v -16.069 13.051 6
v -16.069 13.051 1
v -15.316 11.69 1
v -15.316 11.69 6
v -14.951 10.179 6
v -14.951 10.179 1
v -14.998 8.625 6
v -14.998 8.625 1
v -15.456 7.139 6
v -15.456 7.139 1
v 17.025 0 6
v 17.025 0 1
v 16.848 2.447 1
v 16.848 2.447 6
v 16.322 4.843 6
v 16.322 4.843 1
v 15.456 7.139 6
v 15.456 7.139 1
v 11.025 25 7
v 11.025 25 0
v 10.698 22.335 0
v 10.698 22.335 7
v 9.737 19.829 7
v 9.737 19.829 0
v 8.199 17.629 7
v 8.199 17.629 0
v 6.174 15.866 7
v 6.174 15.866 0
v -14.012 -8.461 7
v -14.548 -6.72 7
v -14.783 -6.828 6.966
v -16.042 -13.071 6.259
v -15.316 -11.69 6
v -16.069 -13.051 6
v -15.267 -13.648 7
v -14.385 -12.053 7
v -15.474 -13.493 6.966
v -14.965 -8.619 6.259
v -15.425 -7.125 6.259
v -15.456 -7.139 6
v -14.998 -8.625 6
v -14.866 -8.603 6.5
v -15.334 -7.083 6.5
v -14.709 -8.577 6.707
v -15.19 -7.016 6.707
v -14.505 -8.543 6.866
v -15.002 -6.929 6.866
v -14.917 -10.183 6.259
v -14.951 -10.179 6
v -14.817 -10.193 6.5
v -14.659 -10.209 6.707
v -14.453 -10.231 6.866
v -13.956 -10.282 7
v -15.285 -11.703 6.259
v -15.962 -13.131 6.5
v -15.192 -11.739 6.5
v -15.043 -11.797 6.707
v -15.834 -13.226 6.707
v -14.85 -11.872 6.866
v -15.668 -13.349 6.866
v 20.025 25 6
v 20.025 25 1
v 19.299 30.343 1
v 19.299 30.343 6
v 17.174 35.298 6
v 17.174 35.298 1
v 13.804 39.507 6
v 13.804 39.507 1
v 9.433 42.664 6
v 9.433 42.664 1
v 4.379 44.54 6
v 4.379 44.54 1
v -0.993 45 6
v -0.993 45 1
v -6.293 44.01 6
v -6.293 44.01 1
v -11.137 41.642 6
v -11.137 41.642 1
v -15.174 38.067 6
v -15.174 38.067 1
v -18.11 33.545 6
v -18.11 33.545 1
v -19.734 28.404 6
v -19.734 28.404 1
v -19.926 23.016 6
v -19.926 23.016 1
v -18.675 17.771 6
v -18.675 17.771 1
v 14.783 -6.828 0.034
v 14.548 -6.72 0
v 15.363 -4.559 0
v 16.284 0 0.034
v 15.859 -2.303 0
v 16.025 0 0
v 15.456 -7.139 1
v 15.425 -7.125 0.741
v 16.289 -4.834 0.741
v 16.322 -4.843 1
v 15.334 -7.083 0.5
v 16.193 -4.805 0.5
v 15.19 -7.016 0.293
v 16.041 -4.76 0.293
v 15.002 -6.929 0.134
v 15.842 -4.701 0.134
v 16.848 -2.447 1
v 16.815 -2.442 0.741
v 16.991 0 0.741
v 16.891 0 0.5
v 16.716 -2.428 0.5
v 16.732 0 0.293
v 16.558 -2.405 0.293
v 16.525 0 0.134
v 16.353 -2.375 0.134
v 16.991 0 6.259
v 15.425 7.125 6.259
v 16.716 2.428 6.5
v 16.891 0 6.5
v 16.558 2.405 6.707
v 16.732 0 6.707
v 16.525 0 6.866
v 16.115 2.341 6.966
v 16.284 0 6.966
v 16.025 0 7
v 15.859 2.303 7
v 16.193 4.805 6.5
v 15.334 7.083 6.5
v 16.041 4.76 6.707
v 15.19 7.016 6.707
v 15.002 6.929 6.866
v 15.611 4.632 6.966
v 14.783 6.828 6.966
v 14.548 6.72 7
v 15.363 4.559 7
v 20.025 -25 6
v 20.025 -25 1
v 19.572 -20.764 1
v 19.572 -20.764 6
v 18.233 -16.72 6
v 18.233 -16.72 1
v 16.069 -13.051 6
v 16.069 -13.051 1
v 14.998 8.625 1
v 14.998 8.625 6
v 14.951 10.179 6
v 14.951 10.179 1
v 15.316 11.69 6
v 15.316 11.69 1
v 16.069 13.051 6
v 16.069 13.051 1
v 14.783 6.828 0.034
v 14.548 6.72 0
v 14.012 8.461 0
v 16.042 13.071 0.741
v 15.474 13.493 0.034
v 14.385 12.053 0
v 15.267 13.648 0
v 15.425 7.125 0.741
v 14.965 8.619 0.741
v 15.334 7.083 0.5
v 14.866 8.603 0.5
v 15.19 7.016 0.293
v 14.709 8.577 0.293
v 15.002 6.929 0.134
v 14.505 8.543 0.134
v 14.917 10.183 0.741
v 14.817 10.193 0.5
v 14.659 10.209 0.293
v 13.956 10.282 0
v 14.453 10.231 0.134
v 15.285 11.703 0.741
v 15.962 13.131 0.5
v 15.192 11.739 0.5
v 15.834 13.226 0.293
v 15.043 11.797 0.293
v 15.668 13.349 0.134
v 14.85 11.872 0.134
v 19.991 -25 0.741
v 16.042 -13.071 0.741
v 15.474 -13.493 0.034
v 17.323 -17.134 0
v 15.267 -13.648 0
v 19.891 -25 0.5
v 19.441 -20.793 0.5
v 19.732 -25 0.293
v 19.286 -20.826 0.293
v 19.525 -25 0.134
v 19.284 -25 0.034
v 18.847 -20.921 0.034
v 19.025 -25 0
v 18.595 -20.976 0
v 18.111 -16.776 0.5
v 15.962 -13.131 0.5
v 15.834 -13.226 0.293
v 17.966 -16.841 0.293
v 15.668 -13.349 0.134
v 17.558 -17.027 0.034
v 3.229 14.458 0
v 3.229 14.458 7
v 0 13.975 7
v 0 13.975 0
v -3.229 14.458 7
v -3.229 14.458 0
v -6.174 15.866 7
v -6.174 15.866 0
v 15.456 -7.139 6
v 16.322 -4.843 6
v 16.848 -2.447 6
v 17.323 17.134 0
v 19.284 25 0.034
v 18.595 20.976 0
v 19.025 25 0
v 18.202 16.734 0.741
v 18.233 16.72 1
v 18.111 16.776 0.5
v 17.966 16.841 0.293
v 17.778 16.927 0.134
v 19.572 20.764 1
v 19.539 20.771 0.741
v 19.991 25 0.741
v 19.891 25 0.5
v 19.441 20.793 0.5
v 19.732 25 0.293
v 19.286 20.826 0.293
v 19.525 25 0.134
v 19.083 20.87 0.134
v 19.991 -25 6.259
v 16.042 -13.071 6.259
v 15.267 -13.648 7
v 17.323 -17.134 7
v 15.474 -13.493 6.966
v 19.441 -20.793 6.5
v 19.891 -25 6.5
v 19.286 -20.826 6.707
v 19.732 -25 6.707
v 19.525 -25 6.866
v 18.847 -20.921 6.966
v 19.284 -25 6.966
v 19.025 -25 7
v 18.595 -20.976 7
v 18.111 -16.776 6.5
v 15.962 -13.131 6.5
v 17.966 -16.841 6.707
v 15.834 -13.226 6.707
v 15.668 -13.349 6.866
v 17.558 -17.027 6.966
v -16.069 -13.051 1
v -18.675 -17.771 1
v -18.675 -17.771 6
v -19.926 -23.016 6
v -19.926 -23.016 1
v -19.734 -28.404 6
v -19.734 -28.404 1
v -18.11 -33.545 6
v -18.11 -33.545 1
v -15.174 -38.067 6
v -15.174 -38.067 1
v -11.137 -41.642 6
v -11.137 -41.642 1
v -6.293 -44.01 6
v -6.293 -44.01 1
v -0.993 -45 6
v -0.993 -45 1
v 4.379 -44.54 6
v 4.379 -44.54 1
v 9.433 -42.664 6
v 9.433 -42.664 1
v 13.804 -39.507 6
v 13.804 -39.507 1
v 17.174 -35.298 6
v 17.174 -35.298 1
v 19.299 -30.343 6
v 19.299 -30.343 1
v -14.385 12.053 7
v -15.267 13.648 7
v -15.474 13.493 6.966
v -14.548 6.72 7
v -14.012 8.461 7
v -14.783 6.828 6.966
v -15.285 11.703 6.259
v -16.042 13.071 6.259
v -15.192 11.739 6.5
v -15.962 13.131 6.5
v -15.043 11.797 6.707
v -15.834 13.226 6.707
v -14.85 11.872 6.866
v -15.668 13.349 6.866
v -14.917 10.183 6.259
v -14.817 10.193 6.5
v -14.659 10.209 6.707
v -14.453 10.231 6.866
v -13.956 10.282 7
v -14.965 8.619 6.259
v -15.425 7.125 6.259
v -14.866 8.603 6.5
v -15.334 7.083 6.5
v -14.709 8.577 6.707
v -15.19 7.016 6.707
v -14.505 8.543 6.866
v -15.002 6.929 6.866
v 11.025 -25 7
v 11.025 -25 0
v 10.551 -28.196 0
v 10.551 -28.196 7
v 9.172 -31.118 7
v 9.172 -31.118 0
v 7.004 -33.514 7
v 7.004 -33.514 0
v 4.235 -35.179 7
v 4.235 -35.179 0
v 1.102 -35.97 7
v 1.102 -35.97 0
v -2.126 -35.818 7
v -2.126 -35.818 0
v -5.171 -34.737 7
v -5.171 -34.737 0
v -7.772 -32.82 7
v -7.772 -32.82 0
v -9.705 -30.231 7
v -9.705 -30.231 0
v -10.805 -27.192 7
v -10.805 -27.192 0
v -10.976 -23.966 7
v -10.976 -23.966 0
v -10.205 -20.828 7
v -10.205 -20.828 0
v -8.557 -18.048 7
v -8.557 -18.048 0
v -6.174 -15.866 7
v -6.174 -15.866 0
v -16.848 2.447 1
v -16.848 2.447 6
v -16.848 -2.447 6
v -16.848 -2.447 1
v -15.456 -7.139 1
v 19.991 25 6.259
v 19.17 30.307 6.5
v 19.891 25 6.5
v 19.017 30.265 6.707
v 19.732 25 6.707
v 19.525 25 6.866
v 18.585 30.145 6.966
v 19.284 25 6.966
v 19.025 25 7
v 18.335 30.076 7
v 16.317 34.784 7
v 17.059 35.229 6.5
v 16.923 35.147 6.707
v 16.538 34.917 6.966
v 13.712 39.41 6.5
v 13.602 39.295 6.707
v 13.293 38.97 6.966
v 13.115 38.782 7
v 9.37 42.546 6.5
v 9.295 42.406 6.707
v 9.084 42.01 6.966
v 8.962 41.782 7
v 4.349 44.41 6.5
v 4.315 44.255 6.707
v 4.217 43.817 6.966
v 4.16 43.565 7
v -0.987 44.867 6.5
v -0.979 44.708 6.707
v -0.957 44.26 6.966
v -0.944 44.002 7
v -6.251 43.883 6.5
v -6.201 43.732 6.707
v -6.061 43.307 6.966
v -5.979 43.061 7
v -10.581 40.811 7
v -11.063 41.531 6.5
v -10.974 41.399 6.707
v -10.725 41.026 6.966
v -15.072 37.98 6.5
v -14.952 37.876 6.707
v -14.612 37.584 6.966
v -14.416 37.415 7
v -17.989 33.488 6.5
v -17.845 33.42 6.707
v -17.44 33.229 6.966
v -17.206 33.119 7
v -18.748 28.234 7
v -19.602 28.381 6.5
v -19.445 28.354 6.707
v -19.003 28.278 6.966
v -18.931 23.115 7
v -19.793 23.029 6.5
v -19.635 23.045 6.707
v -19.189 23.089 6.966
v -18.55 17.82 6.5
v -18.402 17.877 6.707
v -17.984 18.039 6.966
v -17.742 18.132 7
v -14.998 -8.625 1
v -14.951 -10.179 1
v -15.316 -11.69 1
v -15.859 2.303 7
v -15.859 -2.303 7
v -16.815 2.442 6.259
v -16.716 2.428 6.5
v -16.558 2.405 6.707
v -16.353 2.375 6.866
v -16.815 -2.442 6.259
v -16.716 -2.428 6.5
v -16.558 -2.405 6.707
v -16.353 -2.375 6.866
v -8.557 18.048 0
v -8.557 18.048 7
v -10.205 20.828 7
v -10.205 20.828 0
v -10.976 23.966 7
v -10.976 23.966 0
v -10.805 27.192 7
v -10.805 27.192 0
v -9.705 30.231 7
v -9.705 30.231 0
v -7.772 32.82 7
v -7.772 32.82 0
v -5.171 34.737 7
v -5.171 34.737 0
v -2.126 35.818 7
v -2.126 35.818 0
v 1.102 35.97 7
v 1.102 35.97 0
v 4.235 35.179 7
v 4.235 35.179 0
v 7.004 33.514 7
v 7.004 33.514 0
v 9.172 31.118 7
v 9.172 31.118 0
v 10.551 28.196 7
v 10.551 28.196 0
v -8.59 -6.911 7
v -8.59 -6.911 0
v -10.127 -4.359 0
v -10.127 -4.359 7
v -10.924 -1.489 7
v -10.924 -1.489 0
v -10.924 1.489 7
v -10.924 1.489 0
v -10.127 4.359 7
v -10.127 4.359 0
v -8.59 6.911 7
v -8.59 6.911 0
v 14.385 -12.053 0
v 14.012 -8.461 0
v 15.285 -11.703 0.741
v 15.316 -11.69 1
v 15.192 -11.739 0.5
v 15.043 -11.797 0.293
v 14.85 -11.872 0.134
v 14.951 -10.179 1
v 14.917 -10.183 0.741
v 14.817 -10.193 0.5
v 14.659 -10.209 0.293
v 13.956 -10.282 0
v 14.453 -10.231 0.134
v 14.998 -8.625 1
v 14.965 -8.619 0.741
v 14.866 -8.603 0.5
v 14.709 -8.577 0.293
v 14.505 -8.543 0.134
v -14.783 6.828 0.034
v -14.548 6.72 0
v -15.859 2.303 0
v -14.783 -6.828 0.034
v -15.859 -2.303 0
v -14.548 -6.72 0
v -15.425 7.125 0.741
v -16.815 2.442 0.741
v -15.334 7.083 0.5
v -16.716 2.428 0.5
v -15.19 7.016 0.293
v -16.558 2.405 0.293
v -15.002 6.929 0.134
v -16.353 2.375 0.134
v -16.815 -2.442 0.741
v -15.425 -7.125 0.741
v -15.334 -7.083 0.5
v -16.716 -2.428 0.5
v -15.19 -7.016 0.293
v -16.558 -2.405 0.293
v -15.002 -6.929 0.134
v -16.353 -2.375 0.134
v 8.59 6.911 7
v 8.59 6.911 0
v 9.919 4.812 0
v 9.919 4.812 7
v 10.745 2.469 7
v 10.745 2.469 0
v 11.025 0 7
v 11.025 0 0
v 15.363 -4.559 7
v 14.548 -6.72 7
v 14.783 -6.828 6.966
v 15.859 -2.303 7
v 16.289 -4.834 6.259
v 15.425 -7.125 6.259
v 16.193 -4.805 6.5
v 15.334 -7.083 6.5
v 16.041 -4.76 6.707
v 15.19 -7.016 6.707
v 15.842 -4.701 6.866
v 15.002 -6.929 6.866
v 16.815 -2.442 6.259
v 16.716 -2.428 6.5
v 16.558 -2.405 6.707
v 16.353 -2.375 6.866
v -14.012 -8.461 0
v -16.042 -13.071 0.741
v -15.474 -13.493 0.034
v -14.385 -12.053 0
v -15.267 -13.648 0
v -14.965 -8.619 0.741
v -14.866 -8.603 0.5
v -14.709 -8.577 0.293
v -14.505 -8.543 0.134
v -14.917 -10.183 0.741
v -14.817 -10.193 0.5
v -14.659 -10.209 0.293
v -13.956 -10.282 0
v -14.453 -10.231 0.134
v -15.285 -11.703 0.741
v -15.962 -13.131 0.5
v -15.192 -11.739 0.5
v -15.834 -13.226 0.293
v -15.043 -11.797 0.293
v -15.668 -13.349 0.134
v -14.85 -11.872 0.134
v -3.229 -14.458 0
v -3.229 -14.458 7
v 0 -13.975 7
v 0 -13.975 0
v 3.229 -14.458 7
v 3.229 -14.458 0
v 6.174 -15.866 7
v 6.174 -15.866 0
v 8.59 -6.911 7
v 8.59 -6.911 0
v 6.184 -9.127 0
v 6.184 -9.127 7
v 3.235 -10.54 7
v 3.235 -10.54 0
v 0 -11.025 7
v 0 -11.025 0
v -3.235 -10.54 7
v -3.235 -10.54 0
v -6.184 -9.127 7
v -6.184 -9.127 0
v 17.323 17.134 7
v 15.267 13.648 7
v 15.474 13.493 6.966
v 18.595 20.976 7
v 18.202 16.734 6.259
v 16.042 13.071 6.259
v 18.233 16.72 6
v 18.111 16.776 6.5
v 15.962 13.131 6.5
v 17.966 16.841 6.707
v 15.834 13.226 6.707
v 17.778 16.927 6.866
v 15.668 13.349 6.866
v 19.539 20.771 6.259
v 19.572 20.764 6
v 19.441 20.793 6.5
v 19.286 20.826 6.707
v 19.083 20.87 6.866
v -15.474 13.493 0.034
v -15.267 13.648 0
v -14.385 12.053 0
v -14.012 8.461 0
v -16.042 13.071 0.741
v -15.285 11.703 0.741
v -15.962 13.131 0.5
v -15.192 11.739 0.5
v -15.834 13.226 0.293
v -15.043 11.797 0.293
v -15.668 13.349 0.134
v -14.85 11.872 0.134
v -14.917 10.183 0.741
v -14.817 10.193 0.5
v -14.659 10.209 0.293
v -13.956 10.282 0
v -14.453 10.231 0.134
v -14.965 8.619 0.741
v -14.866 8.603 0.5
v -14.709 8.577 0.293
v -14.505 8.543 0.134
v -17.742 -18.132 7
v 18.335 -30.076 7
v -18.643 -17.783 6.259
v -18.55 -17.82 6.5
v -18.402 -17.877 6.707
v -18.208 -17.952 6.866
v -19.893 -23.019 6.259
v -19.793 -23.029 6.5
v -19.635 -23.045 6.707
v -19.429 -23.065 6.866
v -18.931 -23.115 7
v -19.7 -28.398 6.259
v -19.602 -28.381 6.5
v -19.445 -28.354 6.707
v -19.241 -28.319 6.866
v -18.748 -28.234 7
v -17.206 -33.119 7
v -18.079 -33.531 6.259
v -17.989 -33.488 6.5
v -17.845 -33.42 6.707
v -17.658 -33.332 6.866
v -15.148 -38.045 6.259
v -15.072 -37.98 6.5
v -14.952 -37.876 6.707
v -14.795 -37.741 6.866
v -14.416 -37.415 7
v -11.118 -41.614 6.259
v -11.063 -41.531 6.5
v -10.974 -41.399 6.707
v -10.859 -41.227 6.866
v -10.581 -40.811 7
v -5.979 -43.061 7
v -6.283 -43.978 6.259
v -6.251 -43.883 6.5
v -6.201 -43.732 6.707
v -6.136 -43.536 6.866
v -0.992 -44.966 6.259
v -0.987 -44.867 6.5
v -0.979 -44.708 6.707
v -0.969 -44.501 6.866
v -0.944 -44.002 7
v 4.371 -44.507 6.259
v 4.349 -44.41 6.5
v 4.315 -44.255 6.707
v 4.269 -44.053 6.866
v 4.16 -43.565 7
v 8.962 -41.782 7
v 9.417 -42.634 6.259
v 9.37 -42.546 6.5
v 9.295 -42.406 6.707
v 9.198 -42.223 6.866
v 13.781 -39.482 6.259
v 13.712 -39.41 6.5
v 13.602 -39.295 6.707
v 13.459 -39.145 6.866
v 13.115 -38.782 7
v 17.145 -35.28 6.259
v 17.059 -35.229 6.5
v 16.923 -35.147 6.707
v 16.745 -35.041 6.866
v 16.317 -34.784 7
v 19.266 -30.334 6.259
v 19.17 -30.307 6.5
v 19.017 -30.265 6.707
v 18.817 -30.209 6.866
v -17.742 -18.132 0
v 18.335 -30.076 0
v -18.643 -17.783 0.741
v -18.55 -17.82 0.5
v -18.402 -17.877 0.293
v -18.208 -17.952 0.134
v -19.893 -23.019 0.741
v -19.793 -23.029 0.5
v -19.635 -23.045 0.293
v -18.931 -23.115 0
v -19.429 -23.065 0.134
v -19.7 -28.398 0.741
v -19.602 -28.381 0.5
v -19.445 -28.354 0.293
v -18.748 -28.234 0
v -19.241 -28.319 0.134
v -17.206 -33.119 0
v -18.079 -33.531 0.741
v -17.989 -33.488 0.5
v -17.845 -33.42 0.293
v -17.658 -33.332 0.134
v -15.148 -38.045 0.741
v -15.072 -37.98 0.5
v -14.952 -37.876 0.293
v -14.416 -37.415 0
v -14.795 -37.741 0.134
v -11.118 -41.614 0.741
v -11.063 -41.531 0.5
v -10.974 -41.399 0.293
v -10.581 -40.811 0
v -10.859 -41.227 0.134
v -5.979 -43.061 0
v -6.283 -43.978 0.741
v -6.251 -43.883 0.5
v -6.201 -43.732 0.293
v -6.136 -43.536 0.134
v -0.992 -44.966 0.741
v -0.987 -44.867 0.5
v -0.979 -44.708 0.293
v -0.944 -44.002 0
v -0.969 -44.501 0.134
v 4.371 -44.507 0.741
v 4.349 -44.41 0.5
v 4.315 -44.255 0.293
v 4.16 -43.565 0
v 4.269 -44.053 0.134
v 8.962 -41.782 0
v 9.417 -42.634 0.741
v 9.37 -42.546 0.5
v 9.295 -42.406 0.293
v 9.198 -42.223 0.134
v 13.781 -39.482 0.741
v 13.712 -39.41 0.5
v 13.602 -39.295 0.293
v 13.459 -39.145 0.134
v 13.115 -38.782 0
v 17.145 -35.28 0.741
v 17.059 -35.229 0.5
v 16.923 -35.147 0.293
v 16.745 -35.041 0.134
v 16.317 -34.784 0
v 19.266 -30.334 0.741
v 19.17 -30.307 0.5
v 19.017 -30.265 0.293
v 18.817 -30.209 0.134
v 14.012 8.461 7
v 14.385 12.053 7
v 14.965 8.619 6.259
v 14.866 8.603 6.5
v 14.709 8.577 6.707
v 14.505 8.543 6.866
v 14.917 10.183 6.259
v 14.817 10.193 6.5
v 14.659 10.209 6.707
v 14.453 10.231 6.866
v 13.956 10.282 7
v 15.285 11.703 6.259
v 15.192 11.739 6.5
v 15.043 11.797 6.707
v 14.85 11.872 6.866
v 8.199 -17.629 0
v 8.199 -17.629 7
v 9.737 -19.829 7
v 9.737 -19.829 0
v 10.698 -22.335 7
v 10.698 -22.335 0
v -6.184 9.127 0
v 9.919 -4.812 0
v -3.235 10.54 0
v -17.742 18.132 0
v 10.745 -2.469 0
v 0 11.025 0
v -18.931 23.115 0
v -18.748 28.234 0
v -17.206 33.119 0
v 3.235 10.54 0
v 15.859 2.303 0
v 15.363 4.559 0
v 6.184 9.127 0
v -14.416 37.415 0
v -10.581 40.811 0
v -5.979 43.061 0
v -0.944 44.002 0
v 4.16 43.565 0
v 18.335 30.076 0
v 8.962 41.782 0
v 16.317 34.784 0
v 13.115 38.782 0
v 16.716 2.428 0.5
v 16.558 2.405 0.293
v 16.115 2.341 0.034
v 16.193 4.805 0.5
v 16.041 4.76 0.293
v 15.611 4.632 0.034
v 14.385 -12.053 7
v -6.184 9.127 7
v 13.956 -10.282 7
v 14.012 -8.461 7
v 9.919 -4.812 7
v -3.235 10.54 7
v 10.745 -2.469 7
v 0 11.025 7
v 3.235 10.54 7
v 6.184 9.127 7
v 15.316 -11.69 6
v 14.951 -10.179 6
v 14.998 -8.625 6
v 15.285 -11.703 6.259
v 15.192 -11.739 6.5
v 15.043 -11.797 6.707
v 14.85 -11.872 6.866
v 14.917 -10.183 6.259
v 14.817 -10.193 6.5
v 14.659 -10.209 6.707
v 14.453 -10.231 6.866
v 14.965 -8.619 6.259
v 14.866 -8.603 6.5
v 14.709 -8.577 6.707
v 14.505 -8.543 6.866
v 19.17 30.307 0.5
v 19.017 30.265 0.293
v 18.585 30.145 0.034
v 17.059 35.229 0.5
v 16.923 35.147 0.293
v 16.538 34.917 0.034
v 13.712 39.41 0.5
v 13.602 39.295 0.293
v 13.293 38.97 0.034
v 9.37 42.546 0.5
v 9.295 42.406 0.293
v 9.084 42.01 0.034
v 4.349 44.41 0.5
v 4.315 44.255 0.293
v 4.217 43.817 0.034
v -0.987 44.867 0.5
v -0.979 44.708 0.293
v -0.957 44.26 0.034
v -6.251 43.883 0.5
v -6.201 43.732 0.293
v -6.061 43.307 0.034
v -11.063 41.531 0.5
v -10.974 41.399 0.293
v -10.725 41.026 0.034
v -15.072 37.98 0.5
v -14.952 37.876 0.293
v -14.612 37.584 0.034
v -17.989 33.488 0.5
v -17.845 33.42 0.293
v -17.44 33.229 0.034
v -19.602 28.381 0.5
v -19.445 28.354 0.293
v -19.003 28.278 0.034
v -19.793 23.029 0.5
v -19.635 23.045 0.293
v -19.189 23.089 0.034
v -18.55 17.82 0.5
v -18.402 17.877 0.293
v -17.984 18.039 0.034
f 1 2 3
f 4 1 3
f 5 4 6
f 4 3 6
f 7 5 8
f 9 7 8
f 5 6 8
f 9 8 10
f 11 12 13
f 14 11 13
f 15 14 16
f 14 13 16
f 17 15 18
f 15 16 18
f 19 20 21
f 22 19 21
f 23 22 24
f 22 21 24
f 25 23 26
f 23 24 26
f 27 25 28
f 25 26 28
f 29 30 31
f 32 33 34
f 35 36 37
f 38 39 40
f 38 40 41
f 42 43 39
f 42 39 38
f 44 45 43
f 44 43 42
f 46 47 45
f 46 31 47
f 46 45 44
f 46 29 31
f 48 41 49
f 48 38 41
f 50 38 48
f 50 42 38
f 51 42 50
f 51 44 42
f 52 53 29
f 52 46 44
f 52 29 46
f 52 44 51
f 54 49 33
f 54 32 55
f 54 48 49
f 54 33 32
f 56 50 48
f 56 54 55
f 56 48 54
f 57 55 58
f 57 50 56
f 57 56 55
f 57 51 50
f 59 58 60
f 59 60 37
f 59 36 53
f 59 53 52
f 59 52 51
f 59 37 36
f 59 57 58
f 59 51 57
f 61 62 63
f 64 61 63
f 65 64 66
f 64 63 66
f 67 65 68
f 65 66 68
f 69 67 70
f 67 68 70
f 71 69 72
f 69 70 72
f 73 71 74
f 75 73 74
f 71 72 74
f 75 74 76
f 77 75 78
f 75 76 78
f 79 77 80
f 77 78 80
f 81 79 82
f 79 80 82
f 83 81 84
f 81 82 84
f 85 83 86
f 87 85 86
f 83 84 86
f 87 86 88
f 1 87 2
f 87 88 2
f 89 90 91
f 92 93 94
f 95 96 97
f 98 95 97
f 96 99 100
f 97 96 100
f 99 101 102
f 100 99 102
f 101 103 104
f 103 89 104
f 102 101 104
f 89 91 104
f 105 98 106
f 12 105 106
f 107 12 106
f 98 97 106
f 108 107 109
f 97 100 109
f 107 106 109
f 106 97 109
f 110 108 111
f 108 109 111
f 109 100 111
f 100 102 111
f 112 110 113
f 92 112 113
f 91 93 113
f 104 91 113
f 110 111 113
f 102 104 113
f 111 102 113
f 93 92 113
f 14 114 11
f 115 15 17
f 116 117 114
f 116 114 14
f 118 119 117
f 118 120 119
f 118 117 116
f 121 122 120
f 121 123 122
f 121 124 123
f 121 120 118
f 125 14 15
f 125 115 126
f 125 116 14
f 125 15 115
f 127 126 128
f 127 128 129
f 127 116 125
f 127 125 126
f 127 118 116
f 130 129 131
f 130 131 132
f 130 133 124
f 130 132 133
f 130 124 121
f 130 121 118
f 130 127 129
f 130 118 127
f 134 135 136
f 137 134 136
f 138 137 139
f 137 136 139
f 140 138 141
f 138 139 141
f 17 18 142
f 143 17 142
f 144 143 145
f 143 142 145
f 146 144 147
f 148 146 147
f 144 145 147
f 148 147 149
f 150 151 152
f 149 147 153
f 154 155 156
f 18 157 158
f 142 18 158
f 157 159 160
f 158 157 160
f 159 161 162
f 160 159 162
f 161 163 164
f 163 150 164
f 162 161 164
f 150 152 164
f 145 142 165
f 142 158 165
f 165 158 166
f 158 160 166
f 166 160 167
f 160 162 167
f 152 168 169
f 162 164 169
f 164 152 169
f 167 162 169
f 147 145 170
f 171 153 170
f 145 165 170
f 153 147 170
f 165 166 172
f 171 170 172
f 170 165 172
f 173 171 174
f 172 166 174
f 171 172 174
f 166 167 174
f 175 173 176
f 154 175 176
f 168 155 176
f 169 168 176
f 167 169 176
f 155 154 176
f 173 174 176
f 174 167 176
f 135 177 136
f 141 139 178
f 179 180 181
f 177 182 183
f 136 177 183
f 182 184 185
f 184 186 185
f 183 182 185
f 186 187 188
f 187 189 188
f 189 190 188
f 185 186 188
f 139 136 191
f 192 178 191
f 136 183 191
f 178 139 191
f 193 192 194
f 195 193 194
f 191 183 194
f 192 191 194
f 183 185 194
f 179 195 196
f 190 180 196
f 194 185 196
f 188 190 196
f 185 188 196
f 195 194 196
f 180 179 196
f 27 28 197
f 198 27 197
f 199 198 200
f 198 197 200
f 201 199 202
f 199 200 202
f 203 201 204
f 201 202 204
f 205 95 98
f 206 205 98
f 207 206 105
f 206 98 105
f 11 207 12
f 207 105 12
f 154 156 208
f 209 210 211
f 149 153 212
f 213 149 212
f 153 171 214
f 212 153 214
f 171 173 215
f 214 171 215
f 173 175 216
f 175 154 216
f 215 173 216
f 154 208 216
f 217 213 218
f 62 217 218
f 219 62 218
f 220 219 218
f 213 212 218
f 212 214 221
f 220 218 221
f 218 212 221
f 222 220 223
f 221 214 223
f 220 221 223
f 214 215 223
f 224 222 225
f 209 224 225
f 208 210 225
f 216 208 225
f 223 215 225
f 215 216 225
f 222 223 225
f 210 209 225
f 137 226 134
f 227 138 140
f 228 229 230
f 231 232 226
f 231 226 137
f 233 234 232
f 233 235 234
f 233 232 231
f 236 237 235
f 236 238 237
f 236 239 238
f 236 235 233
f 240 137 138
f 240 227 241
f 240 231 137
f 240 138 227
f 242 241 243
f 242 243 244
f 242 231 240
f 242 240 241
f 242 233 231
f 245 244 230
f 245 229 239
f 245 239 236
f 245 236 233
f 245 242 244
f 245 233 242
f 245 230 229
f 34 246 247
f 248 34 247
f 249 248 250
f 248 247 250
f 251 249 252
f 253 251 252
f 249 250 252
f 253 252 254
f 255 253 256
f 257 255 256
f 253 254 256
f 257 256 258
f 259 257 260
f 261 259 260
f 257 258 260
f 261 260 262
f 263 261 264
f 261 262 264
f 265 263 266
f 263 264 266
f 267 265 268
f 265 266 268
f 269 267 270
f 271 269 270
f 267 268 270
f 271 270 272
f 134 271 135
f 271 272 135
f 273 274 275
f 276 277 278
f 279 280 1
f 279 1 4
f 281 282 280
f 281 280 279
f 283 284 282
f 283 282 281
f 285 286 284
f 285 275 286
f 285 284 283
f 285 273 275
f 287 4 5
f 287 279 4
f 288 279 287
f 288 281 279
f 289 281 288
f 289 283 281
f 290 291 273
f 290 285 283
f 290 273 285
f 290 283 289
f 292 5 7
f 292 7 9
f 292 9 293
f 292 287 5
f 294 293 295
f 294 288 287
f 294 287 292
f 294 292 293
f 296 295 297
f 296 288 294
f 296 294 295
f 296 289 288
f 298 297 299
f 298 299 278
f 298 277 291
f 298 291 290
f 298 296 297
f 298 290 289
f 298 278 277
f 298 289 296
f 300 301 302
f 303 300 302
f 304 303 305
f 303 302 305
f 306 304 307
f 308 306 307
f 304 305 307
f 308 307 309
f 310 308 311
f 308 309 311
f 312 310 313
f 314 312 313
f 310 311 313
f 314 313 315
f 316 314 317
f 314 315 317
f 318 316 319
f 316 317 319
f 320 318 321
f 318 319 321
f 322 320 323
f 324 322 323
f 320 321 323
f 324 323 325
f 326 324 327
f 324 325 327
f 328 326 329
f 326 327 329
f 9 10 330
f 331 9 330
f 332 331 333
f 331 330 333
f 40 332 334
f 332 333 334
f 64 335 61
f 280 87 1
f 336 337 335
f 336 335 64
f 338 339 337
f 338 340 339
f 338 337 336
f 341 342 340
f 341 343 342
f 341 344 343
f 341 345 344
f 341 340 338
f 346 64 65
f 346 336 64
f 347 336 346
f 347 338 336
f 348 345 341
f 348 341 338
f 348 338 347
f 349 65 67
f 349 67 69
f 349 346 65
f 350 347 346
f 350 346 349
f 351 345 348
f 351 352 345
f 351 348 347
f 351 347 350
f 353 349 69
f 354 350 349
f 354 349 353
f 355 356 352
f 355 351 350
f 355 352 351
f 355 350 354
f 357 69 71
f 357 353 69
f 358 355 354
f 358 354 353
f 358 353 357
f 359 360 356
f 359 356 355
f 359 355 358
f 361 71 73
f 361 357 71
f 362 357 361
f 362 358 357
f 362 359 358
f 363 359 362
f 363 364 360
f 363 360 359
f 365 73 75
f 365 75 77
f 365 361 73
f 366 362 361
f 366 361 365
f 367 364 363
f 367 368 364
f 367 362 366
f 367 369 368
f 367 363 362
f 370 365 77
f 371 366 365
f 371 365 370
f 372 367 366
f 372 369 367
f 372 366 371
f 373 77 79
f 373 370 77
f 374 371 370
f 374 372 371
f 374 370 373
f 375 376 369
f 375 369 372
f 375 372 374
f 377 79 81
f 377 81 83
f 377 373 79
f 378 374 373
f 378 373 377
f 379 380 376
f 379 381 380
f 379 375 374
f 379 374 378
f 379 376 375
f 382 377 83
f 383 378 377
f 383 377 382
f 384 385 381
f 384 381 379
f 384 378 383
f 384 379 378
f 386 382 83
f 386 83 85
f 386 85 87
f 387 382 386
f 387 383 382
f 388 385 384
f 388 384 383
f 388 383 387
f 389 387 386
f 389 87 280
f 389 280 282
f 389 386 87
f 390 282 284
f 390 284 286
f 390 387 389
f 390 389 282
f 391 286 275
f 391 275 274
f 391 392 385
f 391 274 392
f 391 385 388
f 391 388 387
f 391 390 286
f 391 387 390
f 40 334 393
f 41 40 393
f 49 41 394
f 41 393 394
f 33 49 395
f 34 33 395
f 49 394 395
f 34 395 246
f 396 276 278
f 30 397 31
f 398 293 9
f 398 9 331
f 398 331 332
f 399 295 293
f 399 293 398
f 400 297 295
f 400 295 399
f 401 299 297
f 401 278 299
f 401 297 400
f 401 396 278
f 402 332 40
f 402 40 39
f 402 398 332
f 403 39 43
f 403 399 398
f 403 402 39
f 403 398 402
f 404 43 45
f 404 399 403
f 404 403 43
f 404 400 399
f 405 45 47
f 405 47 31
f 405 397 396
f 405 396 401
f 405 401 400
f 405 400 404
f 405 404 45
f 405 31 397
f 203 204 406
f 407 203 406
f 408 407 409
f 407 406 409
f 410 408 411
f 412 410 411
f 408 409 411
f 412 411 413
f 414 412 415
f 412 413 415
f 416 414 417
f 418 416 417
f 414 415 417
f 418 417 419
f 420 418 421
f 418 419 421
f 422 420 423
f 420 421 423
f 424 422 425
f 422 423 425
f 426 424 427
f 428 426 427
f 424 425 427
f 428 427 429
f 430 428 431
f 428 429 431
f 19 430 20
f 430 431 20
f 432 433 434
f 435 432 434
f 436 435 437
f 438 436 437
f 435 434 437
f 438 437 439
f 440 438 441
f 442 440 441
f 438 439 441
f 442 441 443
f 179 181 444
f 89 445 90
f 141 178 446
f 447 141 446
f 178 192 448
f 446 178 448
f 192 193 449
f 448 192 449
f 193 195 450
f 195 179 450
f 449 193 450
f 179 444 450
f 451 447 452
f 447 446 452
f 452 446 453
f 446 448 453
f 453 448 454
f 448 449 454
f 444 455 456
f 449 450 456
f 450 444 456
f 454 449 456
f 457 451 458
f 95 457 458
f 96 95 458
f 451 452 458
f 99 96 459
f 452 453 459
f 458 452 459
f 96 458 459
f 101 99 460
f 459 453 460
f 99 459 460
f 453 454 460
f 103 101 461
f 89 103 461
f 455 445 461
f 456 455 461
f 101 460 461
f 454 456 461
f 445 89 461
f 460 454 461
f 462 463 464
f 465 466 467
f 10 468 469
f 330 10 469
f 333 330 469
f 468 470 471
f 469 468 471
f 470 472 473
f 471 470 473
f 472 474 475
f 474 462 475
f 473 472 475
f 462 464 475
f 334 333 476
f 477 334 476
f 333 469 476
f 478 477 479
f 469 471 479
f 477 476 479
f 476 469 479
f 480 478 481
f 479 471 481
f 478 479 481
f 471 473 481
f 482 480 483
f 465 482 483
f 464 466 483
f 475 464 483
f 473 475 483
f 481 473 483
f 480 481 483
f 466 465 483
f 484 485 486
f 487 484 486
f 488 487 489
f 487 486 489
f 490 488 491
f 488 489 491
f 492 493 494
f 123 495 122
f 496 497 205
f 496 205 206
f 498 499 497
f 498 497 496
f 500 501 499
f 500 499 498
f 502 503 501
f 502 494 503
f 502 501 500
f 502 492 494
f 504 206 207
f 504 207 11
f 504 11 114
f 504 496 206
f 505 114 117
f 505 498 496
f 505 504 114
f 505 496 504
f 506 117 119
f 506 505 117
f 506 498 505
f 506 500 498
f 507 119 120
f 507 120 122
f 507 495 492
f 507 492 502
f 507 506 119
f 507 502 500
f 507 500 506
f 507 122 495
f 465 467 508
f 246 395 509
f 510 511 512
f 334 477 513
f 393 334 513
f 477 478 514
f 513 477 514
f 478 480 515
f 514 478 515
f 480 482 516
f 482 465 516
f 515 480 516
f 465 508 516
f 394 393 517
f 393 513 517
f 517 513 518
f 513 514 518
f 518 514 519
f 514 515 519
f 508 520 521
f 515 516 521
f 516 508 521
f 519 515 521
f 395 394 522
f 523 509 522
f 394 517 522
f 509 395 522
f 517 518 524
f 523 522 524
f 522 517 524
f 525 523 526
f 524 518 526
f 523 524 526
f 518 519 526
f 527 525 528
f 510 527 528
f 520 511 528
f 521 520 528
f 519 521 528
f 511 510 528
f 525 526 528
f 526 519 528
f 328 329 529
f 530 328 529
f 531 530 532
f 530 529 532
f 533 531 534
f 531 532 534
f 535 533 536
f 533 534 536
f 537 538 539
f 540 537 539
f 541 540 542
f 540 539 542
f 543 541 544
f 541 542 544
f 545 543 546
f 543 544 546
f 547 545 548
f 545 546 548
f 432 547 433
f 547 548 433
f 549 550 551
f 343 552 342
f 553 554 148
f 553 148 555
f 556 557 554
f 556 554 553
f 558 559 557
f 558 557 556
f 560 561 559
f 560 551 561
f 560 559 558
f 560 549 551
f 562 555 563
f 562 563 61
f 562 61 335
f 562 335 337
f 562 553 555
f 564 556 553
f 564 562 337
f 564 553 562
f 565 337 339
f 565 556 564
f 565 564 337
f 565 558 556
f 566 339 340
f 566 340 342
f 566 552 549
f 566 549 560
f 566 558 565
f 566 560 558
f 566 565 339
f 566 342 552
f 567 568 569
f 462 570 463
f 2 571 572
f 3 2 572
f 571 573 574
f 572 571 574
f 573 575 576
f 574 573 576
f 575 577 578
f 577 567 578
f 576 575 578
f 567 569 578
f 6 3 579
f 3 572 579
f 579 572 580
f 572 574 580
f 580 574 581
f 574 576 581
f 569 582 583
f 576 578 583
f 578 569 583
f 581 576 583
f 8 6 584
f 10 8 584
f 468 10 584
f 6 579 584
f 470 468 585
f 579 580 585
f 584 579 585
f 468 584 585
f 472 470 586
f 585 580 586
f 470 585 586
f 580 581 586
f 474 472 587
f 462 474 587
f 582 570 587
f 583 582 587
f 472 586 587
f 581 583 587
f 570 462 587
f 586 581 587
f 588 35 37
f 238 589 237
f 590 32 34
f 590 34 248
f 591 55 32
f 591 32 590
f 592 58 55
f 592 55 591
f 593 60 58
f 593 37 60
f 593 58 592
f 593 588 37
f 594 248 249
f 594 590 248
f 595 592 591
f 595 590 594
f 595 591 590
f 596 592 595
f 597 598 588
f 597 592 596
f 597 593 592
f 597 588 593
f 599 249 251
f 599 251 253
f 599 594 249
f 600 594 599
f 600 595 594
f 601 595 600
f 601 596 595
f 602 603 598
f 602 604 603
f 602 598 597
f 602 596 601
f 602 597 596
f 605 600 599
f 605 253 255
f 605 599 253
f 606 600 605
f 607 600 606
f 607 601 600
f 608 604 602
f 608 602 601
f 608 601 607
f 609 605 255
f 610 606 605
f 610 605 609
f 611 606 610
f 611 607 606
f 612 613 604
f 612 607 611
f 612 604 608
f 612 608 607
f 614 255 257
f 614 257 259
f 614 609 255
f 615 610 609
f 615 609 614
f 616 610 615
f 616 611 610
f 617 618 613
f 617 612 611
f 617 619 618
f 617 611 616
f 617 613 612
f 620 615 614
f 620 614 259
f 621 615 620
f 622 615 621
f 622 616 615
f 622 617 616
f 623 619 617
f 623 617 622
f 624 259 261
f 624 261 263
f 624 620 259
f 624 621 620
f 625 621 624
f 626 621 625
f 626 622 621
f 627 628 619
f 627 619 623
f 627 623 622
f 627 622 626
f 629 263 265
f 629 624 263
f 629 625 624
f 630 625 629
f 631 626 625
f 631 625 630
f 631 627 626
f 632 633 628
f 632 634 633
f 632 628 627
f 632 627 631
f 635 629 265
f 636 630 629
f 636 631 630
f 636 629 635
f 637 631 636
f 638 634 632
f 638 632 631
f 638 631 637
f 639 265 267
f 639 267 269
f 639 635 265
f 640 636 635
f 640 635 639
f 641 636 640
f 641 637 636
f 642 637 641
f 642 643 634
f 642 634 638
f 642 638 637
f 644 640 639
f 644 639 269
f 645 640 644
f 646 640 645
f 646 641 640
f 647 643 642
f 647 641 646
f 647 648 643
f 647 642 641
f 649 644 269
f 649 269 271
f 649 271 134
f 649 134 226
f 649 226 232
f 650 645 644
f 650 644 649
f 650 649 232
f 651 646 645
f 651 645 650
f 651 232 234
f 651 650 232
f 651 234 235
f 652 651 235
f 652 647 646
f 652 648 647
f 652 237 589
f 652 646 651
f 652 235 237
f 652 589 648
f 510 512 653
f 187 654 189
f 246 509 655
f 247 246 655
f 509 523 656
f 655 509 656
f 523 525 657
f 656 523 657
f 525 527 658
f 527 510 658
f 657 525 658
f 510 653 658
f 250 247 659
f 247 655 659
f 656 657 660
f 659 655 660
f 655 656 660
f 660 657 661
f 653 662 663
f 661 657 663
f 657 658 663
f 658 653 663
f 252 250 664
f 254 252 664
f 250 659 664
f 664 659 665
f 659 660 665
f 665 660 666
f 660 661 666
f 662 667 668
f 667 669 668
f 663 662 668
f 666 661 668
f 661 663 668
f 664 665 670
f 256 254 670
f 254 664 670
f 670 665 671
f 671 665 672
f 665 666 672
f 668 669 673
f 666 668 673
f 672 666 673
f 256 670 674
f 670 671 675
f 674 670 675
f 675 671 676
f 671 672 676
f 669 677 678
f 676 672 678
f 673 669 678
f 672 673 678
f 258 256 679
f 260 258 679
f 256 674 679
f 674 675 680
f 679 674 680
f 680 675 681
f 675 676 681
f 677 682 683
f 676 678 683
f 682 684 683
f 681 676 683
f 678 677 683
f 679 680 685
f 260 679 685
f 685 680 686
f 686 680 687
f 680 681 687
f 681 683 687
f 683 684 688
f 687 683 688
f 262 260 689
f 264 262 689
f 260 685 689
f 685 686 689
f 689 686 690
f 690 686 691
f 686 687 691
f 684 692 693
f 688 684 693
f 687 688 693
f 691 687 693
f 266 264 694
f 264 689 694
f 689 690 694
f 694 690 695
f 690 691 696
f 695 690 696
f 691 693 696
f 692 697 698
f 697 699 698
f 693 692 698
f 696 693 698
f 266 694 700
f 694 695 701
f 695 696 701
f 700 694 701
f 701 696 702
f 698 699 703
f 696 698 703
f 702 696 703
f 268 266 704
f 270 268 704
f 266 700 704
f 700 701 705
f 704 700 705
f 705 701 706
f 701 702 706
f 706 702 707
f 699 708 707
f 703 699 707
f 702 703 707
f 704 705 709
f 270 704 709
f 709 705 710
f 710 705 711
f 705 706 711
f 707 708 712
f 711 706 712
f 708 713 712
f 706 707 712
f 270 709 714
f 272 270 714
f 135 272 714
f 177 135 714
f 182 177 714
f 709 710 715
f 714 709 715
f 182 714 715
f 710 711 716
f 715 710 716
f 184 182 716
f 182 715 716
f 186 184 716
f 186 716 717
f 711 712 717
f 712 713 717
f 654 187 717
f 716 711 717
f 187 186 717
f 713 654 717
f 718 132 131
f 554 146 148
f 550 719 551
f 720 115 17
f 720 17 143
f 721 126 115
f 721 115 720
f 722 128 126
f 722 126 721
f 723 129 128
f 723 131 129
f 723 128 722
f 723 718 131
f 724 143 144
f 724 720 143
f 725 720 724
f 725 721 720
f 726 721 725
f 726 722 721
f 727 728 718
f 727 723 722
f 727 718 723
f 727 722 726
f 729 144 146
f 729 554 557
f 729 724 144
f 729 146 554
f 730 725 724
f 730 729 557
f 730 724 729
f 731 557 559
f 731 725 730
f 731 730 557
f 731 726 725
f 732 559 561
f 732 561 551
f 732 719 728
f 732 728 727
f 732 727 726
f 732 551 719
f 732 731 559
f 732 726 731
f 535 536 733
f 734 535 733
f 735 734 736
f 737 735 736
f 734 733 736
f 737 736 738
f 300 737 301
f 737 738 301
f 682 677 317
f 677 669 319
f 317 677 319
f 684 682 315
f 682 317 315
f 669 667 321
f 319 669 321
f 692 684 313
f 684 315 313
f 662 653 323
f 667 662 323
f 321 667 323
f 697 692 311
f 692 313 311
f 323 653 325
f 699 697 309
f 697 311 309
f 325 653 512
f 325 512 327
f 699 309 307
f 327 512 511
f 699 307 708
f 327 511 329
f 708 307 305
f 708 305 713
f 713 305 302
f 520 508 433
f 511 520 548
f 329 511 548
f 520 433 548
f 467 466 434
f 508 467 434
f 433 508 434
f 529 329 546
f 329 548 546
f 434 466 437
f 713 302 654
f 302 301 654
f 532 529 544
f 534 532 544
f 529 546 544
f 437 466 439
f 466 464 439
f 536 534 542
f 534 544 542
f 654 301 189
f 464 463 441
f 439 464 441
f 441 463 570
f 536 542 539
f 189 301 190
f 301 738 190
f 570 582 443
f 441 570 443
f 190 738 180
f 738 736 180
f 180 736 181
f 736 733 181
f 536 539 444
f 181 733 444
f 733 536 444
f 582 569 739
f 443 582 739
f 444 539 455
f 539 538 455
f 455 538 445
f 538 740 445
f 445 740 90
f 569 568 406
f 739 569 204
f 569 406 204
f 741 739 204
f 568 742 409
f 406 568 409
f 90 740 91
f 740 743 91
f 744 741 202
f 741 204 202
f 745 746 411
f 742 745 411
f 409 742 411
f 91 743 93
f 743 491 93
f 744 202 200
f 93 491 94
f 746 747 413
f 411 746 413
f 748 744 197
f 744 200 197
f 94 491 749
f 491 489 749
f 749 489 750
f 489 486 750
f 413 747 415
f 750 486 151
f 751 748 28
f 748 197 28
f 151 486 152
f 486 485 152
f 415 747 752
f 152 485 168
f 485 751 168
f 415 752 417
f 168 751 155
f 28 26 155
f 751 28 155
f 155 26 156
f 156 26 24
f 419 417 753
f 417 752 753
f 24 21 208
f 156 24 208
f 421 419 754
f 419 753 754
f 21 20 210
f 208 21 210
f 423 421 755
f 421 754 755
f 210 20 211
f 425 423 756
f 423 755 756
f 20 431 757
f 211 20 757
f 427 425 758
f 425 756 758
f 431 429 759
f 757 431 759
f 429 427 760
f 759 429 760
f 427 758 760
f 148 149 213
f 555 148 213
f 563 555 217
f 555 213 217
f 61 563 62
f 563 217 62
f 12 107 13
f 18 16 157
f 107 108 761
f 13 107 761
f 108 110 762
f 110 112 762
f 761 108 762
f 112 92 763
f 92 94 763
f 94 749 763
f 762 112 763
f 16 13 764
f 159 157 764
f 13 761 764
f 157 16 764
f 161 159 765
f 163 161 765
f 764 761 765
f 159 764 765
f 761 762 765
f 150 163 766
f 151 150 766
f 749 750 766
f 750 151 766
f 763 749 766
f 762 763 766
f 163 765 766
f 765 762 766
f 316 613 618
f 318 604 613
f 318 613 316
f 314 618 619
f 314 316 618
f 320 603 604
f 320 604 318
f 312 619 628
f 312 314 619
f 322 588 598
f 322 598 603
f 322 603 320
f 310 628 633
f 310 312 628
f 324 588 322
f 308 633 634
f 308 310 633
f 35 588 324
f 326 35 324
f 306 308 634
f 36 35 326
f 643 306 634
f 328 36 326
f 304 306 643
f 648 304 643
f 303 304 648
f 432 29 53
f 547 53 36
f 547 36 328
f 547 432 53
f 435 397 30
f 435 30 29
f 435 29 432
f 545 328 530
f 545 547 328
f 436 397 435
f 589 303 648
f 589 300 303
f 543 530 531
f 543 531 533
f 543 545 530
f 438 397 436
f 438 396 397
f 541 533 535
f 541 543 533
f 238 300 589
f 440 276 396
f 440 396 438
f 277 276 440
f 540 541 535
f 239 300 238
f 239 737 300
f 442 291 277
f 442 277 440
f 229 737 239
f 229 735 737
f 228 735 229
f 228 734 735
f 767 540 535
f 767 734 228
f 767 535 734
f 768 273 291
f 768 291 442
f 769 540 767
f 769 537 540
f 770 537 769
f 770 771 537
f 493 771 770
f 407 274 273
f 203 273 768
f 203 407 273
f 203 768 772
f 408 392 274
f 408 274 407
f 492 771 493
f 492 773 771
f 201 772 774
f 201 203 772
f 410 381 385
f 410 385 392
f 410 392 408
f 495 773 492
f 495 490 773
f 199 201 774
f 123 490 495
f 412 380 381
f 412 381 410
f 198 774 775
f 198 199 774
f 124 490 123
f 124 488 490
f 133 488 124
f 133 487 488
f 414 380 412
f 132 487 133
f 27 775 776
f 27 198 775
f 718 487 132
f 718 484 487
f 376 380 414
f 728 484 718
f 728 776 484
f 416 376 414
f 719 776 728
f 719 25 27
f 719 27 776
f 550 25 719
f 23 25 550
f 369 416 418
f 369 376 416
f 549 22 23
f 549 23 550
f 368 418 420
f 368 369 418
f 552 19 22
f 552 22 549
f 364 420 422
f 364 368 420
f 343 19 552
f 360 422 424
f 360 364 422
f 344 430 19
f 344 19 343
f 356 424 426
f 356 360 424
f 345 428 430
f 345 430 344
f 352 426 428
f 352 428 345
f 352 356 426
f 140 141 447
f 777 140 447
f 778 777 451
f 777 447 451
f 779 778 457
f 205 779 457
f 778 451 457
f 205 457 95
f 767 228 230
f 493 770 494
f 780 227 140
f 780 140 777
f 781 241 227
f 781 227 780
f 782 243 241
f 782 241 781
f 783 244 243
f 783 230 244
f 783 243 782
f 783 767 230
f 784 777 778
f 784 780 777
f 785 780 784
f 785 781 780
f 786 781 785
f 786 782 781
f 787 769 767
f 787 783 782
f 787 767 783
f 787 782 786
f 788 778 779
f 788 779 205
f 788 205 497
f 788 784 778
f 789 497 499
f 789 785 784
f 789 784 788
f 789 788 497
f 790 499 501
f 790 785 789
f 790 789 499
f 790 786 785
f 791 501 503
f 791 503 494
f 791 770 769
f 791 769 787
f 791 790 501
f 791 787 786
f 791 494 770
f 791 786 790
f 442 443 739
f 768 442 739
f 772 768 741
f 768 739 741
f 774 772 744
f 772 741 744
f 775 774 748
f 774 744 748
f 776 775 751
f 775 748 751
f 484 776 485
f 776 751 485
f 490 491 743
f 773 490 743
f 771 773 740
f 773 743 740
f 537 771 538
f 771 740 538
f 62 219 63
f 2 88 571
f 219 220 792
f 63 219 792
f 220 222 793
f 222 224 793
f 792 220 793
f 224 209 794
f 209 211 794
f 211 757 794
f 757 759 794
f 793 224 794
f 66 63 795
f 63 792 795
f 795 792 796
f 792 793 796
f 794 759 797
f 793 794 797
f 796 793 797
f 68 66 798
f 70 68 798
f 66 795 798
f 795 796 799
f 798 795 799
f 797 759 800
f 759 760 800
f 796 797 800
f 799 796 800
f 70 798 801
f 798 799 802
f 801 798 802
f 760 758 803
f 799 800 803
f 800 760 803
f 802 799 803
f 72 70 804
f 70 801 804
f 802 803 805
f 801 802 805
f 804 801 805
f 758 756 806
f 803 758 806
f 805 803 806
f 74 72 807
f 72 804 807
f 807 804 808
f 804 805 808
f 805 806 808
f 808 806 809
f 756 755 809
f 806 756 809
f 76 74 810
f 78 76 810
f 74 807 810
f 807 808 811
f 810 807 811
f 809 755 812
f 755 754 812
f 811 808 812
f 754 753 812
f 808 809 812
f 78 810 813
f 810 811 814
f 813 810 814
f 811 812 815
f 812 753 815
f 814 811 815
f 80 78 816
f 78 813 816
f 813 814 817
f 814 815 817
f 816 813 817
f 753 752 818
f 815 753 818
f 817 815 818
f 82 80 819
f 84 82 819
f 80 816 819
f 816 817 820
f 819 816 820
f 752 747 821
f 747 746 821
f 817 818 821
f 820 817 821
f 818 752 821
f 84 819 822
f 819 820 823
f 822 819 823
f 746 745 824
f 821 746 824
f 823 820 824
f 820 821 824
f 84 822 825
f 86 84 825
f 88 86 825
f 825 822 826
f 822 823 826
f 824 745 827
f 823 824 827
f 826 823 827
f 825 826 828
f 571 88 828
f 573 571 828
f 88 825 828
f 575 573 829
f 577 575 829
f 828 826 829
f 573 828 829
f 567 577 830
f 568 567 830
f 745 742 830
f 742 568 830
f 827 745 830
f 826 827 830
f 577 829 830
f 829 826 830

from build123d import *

# Parameters (mm, degrees)
F1_DEPTH = 7
F2_R     = 1


# Not quite as in the source:
# - a feature names something its author has since deleted; it is built from what else it names


with BuildPart() as f1:
    # F0 (on Top) → F1 (new body)
    with BuildSketch(Plane.XY):
        with BuildLine():
            ThreePointArc((8.5900351571, 6.911), (10.3984557172, 3.6637062787), (11.025, 0))
            ThreePointArc((11.025, 0), (10.3984557172, -3.6637062787), (8.5900351571, -6.911))
            ThreePointArc((8.5900351571, -6.911), (11.2087291798, -8.4058740762), (13.5732787491, -10.277))
            ThreePointArc((13.5732787491, -10.277), (14.5991765239, -8.7586911022), (15.455952476, -7.1389185498))
            ThreePointArc((15.455952476, -7.1389185498), (16.628111978, -3.6546568989), (17.025, 0))
            ThreePointArc((17.025, 0), (16.628111978, 3.6546568989), (15.455952476, 7.1389185498))
            ThreePointArc((15.455952476, 7.1389185498), (14.5991765239, 8.7586911022), (13.5732787491, 10.277))
            ThreePointArc((13.5732787491, 10.277), (11.2087291798, 8.4058740762), (8.5900351571, 6.911))
        make_face()
        with BuildLine():
            ThreePointArc((-8.5900351571, -6.911), (-11.025, 0), (-8.5900351571, 6.911))
            ThreePointArc((-8.5900351571, 6.911), (-11.2087291798, 8.4058740762), (-13.5732787491, 10.277))
            ThreePointArc((-13.5732787491, 10.277), (-14.5991765239, 8.7586911022), (-15.455952476, 7.1389185498))
            ThreePointArc((-15.455952476, 7.1389185498), (-17.025, 0), (-15.455952476, -7.1389185498))
            ThreePointArc((-15.455952476, -7.1389185498), (-14.5991765239, -8.7586911022), (-13.5732787491, -10.277))
            ThreePointArc((-13.5732787491, -10.277), (-11.2087291798, -8.4058740762), (-8.5900351571, -6.911))
        make_face()
        with BuildLine():
            ThreePointArc((6.1741937935, 15.866), (10.2615738659, 13.584944858), (13.5732787491, 10.277))
            ThreePointArc((13.5732787491, 10.277), (14.88595909, 11.6056412259), (16.0691422874, 13.0508037447))
            ThreePointArc((16.0691422874, 13.0508037447), (19.0103287623, 18.7065092876), (20.025, 25))
            ThreePointArc((20.025, 25), (-6.2934907124, 44.0103287623), (-16.0691422874, 13.0508037447))
            ThreePointArc((-16.0691422874, 13.0508037447), (-14.88595909, 11.6056412259), (-13.5732787491, 10.277))
            ThreePointArc((-13.5732787491, 10.277), (-10.2615738659, 13.584944858), (-6.1741937935, 15.866))
            ThreePointArc((-6.1741937935, 15.866), (-5.1710800819, 34.737071212), (11.025, 25))
            ThreePointArc((11.025, 25), (9.737071212, 19.8289199181), (6.1741937935, 15.866))
        make_face()
        with BuildLine():
            ThreePointArc((16.0691422874, 13.0508037447), (14.88595909, 11.6056412259), (13.5732787491, 10.277))
            ThreePointArc((13.5732787491, 10.277), (14.5991765239, 8.7586911022), (15.455952476, 7.1389185498))
            ThreePointArc((15.455952476, 7.1389185498), (14.9507513772, 10.1790618755), (16.0691422874, 13.0508037447))
        make_face()
        with BuildLine():
            ThreePointArc((16.0691422874, -13.0508037447), (14.88595909, -11.6056412259), (13.5732787491, -10.277))
            ThreePointArc((13.5732787491, -10.277), (10.2615738659, -13.584944858), (6.1741937935, -15.866))
            ThreePointArc((6.1741937935, -15.866), (9.737071212, -19.8289199181), (11.025, -25))
            ThreePointArc((11.025, -25), (-5.1710800819, -34.737071212), (-6.1741937935, -15.866))
            ThreePointArc((-6.1741937935, -15.866), (-10.2615738659, -13.584944858), (-13.5732787491, -10.277))
            ThreePointArc((-13.5732787491, -10.277), (-14.88595909, -11.6056412259), (-16.0691422874, -13.0508037447))
            ThreePointArc((-16.0691422874, -13.0508037447), (-6.2934907124, -44.0103287623), (20.025, -25))
            ThreePointArc((20.025, -25), (19.0103287623, -18.7065092876), (16.0691422874, -13.0508037447))
        make_face()
        with BuildLine():
            ThreePointArc((15.455952476, -7.1389185498), (14.5991765239, -8.7586911022), (13.5732787491, -10.277))
            ThreePointArc((13.5732787491, -10.277), (14.88595909, -11.6056412259), (16.0691422874, -13.0508037447))
            ThreePointArc((16.0691422874, -13.0508037447), (14.9507513772, -10.1790618755), (15.455952476, -7.1389185498))
        make_face()
        with BuildLine():
            ThreePointArc((-15.455952476, 7.1389185498), (-14.5991765239, 8.7586911022), (-13.5732787491, 10.277))
            ThreePointArc((-13.5732787491, 10.277), (-14.88595909, 11.6056412259), (-16.0691422874, 13.0508037447))
            ThreePointArc((-16.0691422874, 13.0508037447), (-14.9507513772, 10.1790618755), (-15.455952476, 7.1389185498))
        make_face()
        with BuildLine():
            ThreePointArc((-16.0691422874, -13.0508037447), (-14.88595909, -11.6056412259), (-13.5732787491, -10.277))
            ThreePointArc((-13.5732787491, -10.277), (-14.5991765239, -8.7586911022), (-15.455952476, -7.1389185498))
            ThreePointArc((-15.455952476, -7.1389185498), (-14.9507513772, -10.1790618755), (-16.0691422874, -13.0508037447))
        make_face()
        with BuildLine():
            ThreePointArc((-8.5900351571, 6.911), (0, 11.025), (8.5900351571, 6.911))
            ThreePointArc((8.5900351571, 6.911), (11.2087291798, 8.4058740762), (13.5732787491, 10.277))
            ThreePointArc((13.5732787491, 10.277), (10.2615738659, 13.584944858), (6.1741937935, 15.866))
            ThreePointArc((6.1741937935, 15.866), (0, 13.975), (-6.1741937935, 15.866))
            ThreePointArc((-6.1741937935, 15.866), (-10.2615738659, 13.584944858), (-13.5732787491, 10.277))
            ThreePointArc((-13.5732787491, 10.277), (-11.2087291798, 8.4058740762), (-8.5900351571, 6.911))
        make_face()
        with BuildLine():
            ThreePointArc((13.5732787491, -10.277), (11.2087291798, -8.4058740762), (8.5900351571, -6.911))
            ThreePointArc((8.5900351571, -6.911), (0, -11.025), (-8.5900351571, -6.911))
            ThreePointArc((-8.5900351571, -6.911), (-11.2087291798, -8.4058740762), (-13.5732787491, -10.277))
            ThreePointArc((-13.5732787491, -10.277), (-10.2615738659, -13.584944858), (-6.1741937935, -15.866))
            ThreePointArc((-6.1741937935, -15.866), (0, -13.975), (6.1741937935, -15.866))
            ThreePointArc((6.1741937935, -15.866), (10.2615738659, -13.584944858), (13.5732787491, -10.277))
        make_face()
    extrude(amount=F1_DEPTH)

    # F2
    f2_edges = [f1.edges().sort_by_distance(p)[0] for p in [
        (16.069142, 13.050804, 3.5),
        (-16.069142, 13.050804, 3.5),
        (0, 45.025, 0),
        (0, 45.025, 7),
        (-15.455952, 7.138919, 3.5),
        (-14.950751, 10.179062, 0),
        (-14.950751, 10.179062, 7),
        (-15.455952, -7.138919, 3.5),
        (-16.069142, -13.050804, 3.5),
        (-14.950751, -10.179062, 0),
        (-14.950751, -10.179062, 7),
        (16.069142, -13.050804, 3.5),
        (0, -45.025, 0),
        (0, -45.025, 7),
    ]]
    fillet(f2_edges, radius=F2_R)


solid = f1.part
